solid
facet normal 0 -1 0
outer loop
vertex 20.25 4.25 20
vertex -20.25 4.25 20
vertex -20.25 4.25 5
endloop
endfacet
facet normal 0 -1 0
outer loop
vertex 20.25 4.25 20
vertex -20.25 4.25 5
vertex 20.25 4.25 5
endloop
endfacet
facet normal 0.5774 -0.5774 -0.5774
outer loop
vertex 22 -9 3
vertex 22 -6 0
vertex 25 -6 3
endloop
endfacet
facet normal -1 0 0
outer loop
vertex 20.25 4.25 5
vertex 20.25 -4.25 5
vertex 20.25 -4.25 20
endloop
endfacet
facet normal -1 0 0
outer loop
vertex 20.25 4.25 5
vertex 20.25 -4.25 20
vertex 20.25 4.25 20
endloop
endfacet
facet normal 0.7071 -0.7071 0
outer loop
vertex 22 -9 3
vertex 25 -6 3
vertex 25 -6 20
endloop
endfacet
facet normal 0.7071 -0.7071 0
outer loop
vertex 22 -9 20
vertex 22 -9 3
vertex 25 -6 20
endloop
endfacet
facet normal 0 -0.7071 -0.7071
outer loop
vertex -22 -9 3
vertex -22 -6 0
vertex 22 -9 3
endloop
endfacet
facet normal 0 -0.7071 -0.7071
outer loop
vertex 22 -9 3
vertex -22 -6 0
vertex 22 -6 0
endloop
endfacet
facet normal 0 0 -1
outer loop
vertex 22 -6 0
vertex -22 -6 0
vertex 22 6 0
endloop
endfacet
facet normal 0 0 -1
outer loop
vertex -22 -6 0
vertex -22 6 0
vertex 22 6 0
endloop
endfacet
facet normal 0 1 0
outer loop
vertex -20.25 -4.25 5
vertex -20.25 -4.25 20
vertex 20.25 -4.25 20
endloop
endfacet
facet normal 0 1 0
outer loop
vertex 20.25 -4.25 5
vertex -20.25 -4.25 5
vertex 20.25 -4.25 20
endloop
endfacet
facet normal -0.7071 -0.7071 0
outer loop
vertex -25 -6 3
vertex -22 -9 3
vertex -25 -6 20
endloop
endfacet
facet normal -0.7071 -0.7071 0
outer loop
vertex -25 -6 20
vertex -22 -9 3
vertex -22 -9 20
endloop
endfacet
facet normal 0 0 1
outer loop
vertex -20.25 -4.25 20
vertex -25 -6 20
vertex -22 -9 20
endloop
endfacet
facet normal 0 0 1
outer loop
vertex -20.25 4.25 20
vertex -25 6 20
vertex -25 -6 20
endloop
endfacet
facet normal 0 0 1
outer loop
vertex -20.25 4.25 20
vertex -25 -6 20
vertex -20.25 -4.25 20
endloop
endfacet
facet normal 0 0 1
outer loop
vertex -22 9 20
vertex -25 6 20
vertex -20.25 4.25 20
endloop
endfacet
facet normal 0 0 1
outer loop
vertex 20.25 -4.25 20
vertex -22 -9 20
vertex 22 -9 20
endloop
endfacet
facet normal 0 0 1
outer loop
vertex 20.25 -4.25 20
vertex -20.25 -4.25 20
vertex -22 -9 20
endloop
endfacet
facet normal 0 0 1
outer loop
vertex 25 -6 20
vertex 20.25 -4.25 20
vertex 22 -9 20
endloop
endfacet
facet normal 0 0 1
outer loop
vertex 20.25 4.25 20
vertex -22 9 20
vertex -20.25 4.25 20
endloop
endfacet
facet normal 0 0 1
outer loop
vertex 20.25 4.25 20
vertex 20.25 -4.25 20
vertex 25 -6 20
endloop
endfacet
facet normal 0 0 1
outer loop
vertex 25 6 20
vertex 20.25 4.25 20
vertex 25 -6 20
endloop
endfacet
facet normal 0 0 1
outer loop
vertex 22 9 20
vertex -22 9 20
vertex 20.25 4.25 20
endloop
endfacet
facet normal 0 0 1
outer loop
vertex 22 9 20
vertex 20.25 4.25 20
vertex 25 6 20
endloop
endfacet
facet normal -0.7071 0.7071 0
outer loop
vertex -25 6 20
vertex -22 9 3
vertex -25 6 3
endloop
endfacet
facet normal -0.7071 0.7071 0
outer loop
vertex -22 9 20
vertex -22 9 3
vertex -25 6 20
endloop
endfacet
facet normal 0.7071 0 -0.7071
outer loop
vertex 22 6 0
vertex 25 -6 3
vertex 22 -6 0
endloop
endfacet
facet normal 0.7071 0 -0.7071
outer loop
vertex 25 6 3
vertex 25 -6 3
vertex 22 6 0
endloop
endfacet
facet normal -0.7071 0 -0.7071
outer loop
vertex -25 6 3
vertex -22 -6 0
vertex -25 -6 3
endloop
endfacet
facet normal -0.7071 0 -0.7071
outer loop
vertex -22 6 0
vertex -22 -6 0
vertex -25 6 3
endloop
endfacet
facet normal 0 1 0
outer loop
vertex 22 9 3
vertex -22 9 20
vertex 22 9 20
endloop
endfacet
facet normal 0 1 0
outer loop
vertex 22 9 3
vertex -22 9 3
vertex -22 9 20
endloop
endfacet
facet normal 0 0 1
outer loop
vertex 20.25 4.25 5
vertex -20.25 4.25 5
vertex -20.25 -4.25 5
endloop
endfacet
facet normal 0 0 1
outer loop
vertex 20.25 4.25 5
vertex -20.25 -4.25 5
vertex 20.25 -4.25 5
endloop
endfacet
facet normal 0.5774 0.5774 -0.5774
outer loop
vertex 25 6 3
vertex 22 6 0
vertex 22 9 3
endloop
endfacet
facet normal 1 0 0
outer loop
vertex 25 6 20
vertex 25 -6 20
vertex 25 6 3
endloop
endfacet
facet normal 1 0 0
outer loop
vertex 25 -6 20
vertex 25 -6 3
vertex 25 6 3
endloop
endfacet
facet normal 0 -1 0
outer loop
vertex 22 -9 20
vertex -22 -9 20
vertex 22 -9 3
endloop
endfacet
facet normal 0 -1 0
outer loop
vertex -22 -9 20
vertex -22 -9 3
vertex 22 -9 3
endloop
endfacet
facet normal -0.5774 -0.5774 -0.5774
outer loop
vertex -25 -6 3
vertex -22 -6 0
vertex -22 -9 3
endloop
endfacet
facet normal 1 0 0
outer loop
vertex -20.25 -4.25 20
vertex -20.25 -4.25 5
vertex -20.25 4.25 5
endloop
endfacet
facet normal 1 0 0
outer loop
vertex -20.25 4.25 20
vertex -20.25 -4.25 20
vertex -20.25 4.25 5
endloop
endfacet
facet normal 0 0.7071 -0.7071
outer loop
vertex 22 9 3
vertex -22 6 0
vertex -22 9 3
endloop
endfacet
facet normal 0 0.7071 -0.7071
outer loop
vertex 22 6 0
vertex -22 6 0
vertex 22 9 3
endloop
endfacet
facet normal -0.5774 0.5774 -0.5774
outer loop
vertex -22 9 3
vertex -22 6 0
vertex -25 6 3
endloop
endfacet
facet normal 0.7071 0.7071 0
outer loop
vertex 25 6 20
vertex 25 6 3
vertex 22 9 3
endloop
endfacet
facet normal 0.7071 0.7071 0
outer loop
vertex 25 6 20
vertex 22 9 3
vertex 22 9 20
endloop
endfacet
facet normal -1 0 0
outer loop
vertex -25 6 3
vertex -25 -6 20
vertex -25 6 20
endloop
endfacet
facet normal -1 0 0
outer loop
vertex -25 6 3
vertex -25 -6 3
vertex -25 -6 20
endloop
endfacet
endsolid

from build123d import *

# Parameters (mm, degrees)
F0_W     = 50
F0_H     = 18
F1_DEPTH = 20
F2_W     = 40.5
F2_H     = 8.5
F3_DEPTH = 15
F4_SIZE  = 3


with BuildPart() as f1:
    # F0 (on Top) → F1 (new body)
    with BuildSketch(Plane.XY):
        Rectangle(F0_W, F0_H)
    extrude(amount=F1_DEPTH)

    # F2 (on face) → F3 (cut, through all)
    with BuildSketch(Plane.XY.offset(20)):
        Rectangle(F2_W, F2_H)
    extrude(amount=-F3_DEPTH, mode=Mode.SUBTRACT)

    # F4
    f4_edges = [f1.edges().sort_by_distance(p)[0] for p in [
        (0, -9, 0),
        (-25, 0, 0),
        (0, 9, 0),
        (25, 0, 0),
        (-25, -9, 10),
        (-25, 9, 10),
        (25, 9, 10),
        (25, -9, 10),
    ]]
    chamfer(f4_edges, length=F4_SIZE)


solid = f1.part
